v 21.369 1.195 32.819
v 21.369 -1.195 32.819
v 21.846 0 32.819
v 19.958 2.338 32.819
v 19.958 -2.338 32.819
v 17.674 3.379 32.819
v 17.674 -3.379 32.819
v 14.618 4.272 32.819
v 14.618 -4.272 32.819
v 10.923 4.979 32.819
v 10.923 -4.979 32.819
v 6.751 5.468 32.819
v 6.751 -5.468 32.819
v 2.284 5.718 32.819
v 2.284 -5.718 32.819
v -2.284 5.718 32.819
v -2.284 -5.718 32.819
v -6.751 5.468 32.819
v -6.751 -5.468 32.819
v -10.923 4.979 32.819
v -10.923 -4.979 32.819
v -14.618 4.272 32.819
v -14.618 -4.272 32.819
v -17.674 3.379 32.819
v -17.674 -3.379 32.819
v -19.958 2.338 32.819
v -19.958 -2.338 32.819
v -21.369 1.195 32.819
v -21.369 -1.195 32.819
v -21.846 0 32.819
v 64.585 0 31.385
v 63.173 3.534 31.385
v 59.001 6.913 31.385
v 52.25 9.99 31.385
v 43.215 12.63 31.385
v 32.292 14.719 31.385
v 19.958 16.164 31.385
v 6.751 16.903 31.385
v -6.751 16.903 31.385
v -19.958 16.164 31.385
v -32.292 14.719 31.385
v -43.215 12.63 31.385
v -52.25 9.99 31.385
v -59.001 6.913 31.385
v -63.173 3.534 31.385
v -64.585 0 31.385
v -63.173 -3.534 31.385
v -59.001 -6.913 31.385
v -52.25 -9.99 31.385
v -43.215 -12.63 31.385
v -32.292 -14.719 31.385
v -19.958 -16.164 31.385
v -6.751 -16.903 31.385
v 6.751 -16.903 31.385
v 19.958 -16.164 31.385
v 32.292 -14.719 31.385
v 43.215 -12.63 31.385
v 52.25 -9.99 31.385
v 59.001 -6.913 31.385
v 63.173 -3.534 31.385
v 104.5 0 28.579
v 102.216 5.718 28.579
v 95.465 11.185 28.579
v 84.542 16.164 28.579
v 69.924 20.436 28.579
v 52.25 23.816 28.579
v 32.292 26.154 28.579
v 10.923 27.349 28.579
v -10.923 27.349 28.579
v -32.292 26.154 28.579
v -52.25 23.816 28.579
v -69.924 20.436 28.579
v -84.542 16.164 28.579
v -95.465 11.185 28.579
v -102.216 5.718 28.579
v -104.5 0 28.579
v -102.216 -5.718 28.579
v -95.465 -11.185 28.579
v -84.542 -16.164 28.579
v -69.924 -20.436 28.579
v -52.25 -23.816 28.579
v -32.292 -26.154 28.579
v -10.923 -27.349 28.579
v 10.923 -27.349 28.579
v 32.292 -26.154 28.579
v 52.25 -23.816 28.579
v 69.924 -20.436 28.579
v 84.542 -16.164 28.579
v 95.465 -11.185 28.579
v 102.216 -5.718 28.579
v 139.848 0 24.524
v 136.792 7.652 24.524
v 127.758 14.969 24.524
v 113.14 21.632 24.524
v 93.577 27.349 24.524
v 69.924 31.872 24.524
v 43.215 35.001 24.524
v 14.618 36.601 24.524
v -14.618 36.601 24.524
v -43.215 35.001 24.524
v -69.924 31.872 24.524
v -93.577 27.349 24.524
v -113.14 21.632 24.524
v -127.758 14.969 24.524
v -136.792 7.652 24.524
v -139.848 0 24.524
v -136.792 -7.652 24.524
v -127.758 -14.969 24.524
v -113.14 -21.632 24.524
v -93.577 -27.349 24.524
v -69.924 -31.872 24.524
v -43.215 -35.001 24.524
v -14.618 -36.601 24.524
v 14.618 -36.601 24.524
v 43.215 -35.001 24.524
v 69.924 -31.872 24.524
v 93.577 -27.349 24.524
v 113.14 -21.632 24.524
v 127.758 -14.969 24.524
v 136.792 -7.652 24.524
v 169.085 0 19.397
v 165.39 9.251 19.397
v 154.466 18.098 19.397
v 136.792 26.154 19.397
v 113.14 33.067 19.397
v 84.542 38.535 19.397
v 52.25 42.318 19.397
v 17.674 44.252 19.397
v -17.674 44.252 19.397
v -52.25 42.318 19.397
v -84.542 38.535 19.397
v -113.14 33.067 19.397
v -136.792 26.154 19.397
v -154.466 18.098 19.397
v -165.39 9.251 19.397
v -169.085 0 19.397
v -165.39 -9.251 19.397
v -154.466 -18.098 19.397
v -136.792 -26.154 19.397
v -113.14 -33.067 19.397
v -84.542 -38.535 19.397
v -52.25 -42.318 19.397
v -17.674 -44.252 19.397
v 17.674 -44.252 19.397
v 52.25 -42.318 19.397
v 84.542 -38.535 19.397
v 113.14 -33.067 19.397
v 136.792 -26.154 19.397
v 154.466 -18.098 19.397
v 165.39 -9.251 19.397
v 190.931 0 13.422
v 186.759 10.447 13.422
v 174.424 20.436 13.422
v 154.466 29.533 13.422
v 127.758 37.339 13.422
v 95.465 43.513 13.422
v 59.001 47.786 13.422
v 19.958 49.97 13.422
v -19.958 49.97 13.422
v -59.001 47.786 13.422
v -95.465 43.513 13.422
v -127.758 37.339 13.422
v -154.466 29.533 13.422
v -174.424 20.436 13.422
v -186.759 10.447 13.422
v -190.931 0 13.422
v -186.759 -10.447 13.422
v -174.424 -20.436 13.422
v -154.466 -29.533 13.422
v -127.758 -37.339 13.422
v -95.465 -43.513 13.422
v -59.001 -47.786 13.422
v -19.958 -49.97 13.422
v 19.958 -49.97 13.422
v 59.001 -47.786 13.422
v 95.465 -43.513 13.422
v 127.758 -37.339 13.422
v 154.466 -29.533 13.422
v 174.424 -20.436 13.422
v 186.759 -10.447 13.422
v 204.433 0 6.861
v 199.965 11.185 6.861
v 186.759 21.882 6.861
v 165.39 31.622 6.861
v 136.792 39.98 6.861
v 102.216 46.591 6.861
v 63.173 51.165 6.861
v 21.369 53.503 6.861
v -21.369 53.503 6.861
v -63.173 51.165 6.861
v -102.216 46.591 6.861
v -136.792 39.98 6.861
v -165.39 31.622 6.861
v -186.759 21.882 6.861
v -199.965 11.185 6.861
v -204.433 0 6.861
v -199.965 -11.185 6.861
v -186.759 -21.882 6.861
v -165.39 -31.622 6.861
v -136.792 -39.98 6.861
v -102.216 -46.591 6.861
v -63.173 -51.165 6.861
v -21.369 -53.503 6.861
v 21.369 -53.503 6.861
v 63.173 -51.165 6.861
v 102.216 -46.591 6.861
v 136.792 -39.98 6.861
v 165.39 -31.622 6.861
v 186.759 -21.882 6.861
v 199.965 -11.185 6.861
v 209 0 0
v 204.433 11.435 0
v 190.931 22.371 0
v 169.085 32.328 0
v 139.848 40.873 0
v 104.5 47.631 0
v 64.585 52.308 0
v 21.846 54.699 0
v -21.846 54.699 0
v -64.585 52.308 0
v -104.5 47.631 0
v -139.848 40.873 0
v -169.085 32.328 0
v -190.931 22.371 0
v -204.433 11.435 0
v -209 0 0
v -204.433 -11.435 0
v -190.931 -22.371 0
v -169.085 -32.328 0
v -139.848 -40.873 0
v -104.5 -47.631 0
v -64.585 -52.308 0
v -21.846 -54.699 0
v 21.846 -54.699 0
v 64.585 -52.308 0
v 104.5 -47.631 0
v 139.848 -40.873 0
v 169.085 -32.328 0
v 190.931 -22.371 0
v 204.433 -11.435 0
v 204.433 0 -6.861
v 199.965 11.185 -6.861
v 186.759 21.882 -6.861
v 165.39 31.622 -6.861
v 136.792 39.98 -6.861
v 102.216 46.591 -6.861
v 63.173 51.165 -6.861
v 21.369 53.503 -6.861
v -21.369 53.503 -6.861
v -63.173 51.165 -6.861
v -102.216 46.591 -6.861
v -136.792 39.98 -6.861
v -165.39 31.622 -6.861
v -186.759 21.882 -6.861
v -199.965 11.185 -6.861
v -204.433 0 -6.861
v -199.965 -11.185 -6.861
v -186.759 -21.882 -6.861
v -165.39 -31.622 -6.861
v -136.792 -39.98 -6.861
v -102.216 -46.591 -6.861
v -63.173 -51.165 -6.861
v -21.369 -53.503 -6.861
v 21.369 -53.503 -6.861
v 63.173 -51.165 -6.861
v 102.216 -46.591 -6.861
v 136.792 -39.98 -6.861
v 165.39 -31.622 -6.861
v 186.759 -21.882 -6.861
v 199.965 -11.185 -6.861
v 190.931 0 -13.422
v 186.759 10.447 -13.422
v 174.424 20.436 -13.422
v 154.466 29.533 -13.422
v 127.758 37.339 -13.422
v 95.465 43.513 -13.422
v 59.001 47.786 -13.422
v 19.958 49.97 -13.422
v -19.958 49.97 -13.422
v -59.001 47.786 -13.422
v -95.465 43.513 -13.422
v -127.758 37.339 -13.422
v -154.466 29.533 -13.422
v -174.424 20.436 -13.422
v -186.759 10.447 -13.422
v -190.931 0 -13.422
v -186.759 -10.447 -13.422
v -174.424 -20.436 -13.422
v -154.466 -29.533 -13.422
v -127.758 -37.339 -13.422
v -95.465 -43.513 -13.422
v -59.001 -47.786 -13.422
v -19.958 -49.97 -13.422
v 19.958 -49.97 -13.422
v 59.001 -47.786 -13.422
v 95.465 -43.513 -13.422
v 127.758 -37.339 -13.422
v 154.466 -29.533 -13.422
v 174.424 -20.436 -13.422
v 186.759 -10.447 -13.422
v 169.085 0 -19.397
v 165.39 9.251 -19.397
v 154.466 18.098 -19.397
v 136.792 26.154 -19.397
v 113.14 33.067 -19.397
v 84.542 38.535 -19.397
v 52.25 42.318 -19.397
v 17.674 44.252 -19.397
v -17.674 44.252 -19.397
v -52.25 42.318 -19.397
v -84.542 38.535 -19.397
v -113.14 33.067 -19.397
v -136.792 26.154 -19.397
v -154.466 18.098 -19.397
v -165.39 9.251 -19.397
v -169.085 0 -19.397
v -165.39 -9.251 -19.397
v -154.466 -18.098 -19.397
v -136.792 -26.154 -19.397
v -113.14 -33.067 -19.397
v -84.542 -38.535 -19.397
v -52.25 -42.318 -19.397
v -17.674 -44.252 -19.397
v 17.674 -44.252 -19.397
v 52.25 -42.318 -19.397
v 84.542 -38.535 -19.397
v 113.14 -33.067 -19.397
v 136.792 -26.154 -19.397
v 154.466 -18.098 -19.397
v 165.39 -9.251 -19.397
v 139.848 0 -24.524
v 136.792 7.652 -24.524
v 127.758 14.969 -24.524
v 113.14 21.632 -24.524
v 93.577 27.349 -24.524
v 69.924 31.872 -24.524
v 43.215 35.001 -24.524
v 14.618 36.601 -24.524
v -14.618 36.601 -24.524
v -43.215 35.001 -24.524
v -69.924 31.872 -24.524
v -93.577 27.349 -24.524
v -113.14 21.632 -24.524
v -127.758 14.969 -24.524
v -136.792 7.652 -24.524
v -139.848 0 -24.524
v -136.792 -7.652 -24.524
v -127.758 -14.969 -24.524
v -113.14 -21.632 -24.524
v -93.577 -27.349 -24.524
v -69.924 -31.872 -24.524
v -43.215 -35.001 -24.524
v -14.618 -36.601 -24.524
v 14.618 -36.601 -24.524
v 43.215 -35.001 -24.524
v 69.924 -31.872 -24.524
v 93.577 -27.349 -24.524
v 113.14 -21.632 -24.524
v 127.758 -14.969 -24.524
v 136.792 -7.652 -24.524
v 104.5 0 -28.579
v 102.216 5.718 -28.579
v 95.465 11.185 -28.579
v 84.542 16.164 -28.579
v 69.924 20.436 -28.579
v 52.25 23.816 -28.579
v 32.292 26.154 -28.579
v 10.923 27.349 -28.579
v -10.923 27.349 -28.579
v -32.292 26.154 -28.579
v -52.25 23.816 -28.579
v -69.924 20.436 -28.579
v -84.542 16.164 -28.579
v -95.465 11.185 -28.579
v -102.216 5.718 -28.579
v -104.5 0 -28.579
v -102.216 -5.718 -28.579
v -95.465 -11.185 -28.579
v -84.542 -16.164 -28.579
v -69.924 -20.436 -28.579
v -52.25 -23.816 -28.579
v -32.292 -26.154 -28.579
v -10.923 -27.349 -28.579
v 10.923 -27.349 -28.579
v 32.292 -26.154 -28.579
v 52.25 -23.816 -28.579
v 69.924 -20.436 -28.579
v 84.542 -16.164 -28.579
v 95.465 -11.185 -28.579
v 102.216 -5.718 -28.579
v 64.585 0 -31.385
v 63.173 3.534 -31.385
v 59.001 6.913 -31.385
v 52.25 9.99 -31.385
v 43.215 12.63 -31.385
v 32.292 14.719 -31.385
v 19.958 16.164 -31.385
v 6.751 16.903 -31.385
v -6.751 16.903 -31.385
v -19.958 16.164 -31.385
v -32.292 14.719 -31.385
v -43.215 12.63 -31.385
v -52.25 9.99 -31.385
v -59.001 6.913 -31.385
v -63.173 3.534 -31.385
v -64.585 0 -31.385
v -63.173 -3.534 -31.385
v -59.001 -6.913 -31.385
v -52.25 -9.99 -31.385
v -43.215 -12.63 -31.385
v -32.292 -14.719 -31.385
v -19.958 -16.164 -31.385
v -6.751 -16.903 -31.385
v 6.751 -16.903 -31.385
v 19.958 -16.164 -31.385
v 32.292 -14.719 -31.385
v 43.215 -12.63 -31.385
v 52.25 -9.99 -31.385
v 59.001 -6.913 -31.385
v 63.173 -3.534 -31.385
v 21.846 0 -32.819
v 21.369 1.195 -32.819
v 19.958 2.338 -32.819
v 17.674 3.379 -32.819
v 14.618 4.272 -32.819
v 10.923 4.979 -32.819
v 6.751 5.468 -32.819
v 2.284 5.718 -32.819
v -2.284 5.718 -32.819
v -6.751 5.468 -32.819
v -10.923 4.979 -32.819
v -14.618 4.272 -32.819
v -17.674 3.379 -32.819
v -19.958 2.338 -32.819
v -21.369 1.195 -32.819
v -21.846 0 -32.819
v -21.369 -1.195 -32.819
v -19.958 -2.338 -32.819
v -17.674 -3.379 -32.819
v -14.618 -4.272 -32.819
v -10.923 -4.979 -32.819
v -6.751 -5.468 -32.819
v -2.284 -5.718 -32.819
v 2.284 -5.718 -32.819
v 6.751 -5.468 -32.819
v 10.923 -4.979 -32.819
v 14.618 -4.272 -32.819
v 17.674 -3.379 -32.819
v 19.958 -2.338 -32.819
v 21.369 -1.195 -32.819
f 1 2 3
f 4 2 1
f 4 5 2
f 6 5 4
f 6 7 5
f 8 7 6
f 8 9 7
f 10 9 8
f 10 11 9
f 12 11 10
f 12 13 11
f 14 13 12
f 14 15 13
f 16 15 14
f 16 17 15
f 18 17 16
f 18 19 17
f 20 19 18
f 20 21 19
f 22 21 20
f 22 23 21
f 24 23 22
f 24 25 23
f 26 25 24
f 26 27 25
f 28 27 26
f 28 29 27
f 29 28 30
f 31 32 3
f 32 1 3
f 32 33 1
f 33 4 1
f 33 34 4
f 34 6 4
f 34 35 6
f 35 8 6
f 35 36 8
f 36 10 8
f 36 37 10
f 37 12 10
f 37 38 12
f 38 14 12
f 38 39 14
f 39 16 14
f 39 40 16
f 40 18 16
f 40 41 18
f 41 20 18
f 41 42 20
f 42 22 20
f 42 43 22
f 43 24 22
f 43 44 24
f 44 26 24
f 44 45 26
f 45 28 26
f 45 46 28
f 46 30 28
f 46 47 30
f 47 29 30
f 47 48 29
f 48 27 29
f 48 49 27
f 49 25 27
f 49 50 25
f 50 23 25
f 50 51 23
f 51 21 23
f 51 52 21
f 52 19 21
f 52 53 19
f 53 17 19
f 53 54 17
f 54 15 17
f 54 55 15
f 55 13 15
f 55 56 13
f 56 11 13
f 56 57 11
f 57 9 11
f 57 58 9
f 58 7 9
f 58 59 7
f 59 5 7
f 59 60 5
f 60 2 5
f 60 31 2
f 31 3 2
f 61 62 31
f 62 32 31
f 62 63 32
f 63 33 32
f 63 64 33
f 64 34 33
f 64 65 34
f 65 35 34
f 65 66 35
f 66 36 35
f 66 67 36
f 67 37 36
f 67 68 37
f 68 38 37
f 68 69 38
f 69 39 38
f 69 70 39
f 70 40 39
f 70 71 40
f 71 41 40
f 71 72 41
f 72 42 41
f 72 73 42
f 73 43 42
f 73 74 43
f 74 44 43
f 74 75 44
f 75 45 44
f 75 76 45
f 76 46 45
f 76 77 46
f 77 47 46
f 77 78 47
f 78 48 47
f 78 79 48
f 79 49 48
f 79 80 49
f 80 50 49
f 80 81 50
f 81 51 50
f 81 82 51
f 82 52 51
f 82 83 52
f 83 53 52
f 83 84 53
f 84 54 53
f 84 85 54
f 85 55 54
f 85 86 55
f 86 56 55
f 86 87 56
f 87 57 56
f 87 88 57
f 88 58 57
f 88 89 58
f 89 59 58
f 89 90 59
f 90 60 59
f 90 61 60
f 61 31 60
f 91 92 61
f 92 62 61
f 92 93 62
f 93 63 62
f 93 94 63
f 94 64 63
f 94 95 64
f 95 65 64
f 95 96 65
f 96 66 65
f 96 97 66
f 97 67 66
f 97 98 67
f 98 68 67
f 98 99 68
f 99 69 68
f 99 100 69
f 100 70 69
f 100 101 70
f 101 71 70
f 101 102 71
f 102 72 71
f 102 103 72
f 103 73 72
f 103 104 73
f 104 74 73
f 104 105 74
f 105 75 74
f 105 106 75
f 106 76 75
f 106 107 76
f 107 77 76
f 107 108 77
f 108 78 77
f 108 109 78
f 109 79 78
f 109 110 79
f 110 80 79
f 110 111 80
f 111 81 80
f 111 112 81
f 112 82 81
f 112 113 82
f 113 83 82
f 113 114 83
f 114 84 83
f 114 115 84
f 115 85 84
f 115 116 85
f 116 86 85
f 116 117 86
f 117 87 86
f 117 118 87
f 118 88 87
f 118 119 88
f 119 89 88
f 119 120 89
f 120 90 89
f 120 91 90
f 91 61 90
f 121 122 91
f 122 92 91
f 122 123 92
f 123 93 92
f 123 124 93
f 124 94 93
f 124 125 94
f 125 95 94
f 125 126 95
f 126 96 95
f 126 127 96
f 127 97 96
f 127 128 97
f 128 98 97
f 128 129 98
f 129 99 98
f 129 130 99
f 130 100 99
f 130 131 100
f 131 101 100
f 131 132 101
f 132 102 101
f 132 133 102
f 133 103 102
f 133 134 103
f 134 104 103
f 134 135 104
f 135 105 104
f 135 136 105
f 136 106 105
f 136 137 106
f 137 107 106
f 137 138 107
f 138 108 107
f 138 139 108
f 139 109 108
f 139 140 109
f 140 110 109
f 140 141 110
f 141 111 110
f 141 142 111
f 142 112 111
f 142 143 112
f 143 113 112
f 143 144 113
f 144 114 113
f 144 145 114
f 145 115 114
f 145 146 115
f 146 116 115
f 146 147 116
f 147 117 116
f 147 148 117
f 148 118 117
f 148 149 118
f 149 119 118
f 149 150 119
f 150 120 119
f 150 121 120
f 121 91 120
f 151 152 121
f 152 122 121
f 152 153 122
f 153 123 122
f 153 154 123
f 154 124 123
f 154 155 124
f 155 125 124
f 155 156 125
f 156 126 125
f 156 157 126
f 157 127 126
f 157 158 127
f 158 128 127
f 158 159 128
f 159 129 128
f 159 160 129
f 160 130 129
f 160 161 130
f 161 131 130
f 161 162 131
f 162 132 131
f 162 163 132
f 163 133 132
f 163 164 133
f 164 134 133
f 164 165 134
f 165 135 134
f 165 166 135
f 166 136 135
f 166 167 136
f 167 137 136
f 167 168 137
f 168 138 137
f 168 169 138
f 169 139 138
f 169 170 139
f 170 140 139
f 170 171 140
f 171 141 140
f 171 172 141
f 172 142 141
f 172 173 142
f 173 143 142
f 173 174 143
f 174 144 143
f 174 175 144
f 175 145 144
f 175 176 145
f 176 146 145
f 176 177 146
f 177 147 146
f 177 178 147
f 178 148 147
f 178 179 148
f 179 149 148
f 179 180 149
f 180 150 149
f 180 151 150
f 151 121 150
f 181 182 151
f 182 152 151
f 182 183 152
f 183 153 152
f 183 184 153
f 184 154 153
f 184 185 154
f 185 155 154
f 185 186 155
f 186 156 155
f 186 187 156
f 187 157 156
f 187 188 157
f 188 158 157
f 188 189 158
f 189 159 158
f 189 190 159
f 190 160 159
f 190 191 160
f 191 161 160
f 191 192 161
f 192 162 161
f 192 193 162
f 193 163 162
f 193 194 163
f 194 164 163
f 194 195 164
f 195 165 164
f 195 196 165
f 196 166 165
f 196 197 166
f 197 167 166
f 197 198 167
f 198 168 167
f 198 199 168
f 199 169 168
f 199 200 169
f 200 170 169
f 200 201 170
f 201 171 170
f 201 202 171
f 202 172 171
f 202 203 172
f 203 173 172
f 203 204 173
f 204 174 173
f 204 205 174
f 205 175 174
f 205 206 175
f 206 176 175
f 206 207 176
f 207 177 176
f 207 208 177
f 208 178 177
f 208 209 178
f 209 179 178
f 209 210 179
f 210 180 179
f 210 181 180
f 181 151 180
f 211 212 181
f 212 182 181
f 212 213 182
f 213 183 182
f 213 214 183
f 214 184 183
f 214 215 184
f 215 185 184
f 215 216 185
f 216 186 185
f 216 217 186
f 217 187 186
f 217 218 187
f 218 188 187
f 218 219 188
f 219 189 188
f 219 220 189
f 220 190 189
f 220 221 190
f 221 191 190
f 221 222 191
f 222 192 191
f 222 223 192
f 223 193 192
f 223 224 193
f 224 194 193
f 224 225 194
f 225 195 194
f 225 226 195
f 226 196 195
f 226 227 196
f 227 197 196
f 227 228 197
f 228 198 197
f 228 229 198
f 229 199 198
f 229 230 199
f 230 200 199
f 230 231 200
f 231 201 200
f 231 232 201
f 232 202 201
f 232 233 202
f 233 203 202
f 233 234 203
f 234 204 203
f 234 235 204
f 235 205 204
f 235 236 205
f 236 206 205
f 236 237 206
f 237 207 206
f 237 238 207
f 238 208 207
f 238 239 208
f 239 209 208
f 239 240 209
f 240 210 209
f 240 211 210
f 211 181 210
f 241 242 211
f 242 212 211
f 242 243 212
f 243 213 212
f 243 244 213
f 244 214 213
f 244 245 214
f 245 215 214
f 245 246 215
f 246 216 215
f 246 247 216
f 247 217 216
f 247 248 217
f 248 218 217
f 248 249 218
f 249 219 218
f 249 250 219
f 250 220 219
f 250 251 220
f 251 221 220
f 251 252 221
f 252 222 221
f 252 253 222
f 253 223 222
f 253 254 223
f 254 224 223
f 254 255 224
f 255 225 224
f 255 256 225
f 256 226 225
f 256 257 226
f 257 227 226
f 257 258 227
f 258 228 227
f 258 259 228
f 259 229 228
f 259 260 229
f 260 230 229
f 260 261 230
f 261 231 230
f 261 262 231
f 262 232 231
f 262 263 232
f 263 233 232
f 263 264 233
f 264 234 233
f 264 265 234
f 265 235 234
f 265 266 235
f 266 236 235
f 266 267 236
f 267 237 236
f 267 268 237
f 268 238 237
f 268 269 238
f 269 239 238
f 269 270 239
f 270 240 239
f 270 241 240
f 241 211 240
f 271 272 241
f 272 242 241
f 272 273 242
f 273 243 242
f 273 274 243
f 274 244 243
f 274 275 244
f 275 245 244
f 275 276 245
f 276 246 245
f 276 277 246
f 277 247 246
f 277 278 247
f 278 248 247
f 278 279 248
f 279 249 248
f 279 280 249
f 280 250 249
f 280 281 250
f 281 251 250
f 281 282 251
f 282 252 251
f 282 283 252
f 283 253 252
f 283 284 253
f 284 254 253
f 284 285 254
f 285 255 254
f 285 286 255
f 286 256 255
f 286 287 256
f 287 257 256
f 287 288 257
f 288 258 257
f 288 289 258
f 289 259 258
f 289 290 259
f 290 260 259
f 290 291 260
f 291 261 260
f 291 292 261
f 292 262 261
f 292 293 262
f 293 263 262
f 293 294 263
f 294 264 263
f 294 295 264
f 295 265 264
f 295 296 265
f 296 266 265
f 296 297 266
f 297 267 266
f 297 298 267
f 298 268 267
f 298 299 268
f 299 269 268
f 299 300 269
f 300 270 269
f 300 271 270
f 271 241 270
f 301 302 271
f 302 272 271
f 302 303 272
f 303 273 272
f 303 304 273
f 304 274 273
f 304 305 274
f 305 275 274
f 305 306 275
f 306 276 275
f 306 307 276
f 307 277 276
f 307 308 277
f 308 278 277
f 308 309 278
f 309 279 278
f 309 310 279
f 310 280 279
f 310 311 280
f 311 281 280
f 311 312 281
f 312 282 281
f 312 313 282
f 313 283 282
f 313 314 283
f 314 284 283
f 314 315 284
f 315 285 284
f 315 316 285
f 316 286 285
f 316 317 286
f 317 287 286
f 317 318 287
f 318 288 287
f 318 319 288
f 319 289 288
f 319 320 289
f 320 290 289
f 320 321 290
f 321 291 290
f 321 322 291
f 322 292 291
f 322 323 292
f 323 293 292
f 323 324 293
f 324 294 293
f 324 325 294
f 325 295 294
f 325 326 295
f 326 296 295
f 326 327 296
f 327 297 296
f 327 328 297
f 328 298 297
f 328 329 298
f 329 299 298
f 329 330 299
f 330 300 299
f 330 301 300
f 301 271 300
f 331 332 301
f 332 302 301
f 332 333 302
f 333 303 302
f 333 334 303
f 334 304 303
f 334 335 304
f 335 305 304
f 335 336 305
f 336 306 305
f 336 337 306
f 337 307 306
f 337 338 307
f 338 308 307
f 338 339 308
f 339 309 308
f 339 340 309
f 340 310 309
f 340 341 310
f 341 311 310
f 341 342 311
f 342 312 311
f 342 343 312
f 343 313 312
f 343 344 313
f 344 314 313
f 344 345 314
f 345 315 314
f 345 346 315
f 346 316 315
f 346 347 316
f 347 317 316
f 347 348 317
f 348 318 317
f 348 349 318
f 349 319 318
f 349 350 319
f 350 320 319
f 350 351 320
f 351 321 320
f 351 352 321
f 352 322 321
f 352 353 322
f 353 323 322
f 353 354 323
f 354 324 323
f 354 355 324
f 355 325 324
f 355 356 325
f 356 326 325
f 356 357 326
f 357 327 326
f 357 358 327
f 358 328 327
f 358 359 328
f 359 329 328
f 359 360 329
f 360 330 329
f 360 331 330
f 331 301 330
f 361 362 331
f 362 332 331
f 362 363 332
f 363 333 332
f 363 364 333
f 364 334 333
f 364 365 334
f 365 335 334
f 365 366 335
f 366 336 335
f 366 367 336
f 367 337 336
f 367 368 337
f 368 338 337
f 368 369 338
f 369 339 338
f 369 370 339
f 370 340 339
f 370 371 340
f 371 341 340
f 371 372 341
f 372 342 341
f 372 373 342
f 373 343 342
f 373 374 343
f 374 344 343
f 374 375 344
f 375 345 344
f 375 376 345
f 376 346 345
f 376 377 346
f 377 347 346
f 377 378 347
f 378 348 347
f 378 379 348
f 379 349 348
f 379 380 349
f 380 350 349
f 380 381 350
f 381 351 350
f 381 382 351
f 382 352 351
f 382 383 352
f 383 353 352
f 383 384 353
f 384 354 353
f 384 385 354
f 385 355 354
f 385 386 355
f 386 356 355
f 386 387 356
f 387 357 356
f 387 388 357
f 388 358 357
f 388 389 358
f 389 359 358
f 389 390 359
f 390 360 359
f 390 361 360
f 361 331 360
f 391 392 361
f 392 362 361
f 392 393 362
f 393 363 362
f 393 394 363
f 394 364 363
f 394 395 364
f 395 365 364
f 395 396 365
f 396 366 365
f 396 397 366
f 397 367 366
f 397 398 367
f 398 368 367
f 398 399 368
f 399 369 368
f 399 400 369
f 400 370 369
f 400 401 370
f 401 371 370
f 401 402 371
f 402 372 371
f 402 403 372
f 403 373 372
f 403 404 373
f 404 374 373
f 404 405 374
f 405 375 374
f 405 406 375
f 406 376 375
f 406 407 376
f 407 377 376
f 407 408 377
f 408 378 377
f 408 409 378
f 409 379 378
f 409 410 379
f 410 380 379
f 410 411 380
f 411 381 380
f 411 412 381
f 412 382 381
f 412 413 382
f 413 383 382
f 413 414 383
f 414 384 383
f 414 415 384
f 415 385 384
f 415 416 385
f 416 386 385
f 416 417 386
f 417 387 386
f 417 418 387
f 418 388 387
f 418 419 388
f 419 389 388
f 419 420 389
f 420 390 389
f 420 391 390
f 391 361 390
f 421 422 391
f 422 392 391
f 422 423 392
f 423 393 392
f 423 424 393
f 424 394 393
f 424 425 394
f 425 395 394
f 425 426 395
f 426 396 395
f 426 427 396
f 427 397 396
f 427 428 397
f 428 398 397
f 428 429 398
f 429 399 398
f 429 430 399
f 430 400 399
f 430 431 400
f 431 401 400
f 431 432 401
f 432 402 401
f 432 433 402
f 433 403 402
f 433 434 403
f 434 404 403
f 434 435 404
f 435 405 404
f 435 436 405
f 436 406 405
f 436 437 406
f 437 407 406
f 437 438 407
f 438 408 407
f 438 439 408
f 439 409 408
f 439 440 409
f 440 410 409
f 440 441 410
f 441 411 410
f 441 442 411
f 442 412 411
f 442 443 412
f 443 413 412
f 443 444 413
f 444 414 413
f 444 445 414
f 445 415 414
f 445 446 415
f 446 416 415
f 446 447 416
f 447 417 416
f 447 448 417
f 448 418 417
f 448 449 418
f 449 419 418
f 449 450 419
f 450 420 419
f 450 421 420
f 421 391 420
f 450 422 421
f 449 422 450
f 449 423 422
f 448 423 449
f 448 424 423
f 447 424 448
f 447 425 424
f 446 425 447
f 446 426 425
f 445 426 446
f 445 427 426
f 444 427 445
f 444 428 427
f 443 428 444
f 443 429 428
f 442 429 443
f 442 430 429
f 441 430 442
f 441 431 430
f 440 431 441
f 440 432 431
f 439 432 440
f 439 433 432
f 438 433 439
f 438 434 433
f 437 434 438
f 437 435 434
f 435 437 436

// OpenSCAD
// Generated by SolidPython 1.0.1 on 2020-07-29 00:46:53


scale(v = [19, 5, 3]) {
	sphere(r = 11);
}
/***********************************************
*********      SolidPython code:      **********
************************************************
 
# import packages: SolidPython
from solid import *
from solid.utils import *
from itertools import chain, combinations, permutations


class Resize:

    def __init__(self, scad_file):
        self.scad_file = scad_file
        #self.scad_file = import_scad(scad_file)
        # cone/cylinder param:
        self.r1 = 0
        self.r2 = 0
        self.h = 0
        # rectangular prism param:
        self.w = 0
        self.l = 0
        # ellipse param:
        self.r = 0

    # import OpenScad code (file name corresponds to shape)


    # classify shape + parameters
    def assign(self, param1, param2, param3):
        if self.scad_file == 'cone.scad':
            self.r1 = param1
            self.r2 = param2
            self.h = param3
        elif self.scad_file == 'cylinder.scad':
            self.r1 = param1
            self.r2 = param2
            self.h = param3
        elif self.scad_file == 'rectangularPrism.scad':
            self.h = param1
            self.l = param2
            self.w = param3
        else:
            self.r = param1
            self.h = param2

    # resize parameters
    def iterate(self):
        x = range(3, 20, 2)
        i = 1
        if self.scad_file == 'cone.scad':
            tempList = list(permutations(x, 2))
            for temp in tempList:
                param1 = temp[0]
                param2 = temp[1]
                filepath = 'produced_scad_files/' + 'cone' + str(param1) + '_' + str(param2) + '_' + '.scad'
                scad_render_to_file(cylinder(h=param1, r1=param2, r2=0), filepath)

        elif self.scad_file == 'cylinder.scad':
            tempList = list(permutations(x, 3))
            for temp in tempList:
                param1 = temp[0]
                param2 = temp[1]
                filepath = 'produced_scad_files/' + 'cylinder' + str(param1) + '_' + str(param2) + '_' + '.scad'
                scad_render_to_file(cylinder(h=param1, r1=param2, r2=param2), filepath)

        elif self.scad_file == 'rectangularPrism.scad':
            tempList = list(permutations(x, 3))
            for temp in tempList:
                param1 = temp[0]
                param2 = temp[1]
                param3 = temp[2]
                filepath = 'produced_scad_files/' + 'rectangularPrism' + str(param1) + '_' + str(param2) + '_' + str(
                    param3) + '.scad'
                scad_render_to_file(cube(size=(param1, param2, param3)), filepath)

        elif self.scad_file == 'ellipse.scad':
            tempList = list(permutations(x, 4))
            for temp in tempList:
                param1 = temp[0]
                param2 = temp[1]
                param3 = temp[2]
                param4 = temp[3]
                filepath = 'produced_scad_files/' + 'ellipse' + str(param1) + '_' + str(param2) + '_' + str(param3) + '_' + str(param4) + '.scad'
                scad_render_to_file(scale([param1, param2, param3])(sphere(r=param4)), filepath)

    def render_to_scadfile(self):
        scad_render_to_file(scad, 'example.scad') 
 
************************************************/
